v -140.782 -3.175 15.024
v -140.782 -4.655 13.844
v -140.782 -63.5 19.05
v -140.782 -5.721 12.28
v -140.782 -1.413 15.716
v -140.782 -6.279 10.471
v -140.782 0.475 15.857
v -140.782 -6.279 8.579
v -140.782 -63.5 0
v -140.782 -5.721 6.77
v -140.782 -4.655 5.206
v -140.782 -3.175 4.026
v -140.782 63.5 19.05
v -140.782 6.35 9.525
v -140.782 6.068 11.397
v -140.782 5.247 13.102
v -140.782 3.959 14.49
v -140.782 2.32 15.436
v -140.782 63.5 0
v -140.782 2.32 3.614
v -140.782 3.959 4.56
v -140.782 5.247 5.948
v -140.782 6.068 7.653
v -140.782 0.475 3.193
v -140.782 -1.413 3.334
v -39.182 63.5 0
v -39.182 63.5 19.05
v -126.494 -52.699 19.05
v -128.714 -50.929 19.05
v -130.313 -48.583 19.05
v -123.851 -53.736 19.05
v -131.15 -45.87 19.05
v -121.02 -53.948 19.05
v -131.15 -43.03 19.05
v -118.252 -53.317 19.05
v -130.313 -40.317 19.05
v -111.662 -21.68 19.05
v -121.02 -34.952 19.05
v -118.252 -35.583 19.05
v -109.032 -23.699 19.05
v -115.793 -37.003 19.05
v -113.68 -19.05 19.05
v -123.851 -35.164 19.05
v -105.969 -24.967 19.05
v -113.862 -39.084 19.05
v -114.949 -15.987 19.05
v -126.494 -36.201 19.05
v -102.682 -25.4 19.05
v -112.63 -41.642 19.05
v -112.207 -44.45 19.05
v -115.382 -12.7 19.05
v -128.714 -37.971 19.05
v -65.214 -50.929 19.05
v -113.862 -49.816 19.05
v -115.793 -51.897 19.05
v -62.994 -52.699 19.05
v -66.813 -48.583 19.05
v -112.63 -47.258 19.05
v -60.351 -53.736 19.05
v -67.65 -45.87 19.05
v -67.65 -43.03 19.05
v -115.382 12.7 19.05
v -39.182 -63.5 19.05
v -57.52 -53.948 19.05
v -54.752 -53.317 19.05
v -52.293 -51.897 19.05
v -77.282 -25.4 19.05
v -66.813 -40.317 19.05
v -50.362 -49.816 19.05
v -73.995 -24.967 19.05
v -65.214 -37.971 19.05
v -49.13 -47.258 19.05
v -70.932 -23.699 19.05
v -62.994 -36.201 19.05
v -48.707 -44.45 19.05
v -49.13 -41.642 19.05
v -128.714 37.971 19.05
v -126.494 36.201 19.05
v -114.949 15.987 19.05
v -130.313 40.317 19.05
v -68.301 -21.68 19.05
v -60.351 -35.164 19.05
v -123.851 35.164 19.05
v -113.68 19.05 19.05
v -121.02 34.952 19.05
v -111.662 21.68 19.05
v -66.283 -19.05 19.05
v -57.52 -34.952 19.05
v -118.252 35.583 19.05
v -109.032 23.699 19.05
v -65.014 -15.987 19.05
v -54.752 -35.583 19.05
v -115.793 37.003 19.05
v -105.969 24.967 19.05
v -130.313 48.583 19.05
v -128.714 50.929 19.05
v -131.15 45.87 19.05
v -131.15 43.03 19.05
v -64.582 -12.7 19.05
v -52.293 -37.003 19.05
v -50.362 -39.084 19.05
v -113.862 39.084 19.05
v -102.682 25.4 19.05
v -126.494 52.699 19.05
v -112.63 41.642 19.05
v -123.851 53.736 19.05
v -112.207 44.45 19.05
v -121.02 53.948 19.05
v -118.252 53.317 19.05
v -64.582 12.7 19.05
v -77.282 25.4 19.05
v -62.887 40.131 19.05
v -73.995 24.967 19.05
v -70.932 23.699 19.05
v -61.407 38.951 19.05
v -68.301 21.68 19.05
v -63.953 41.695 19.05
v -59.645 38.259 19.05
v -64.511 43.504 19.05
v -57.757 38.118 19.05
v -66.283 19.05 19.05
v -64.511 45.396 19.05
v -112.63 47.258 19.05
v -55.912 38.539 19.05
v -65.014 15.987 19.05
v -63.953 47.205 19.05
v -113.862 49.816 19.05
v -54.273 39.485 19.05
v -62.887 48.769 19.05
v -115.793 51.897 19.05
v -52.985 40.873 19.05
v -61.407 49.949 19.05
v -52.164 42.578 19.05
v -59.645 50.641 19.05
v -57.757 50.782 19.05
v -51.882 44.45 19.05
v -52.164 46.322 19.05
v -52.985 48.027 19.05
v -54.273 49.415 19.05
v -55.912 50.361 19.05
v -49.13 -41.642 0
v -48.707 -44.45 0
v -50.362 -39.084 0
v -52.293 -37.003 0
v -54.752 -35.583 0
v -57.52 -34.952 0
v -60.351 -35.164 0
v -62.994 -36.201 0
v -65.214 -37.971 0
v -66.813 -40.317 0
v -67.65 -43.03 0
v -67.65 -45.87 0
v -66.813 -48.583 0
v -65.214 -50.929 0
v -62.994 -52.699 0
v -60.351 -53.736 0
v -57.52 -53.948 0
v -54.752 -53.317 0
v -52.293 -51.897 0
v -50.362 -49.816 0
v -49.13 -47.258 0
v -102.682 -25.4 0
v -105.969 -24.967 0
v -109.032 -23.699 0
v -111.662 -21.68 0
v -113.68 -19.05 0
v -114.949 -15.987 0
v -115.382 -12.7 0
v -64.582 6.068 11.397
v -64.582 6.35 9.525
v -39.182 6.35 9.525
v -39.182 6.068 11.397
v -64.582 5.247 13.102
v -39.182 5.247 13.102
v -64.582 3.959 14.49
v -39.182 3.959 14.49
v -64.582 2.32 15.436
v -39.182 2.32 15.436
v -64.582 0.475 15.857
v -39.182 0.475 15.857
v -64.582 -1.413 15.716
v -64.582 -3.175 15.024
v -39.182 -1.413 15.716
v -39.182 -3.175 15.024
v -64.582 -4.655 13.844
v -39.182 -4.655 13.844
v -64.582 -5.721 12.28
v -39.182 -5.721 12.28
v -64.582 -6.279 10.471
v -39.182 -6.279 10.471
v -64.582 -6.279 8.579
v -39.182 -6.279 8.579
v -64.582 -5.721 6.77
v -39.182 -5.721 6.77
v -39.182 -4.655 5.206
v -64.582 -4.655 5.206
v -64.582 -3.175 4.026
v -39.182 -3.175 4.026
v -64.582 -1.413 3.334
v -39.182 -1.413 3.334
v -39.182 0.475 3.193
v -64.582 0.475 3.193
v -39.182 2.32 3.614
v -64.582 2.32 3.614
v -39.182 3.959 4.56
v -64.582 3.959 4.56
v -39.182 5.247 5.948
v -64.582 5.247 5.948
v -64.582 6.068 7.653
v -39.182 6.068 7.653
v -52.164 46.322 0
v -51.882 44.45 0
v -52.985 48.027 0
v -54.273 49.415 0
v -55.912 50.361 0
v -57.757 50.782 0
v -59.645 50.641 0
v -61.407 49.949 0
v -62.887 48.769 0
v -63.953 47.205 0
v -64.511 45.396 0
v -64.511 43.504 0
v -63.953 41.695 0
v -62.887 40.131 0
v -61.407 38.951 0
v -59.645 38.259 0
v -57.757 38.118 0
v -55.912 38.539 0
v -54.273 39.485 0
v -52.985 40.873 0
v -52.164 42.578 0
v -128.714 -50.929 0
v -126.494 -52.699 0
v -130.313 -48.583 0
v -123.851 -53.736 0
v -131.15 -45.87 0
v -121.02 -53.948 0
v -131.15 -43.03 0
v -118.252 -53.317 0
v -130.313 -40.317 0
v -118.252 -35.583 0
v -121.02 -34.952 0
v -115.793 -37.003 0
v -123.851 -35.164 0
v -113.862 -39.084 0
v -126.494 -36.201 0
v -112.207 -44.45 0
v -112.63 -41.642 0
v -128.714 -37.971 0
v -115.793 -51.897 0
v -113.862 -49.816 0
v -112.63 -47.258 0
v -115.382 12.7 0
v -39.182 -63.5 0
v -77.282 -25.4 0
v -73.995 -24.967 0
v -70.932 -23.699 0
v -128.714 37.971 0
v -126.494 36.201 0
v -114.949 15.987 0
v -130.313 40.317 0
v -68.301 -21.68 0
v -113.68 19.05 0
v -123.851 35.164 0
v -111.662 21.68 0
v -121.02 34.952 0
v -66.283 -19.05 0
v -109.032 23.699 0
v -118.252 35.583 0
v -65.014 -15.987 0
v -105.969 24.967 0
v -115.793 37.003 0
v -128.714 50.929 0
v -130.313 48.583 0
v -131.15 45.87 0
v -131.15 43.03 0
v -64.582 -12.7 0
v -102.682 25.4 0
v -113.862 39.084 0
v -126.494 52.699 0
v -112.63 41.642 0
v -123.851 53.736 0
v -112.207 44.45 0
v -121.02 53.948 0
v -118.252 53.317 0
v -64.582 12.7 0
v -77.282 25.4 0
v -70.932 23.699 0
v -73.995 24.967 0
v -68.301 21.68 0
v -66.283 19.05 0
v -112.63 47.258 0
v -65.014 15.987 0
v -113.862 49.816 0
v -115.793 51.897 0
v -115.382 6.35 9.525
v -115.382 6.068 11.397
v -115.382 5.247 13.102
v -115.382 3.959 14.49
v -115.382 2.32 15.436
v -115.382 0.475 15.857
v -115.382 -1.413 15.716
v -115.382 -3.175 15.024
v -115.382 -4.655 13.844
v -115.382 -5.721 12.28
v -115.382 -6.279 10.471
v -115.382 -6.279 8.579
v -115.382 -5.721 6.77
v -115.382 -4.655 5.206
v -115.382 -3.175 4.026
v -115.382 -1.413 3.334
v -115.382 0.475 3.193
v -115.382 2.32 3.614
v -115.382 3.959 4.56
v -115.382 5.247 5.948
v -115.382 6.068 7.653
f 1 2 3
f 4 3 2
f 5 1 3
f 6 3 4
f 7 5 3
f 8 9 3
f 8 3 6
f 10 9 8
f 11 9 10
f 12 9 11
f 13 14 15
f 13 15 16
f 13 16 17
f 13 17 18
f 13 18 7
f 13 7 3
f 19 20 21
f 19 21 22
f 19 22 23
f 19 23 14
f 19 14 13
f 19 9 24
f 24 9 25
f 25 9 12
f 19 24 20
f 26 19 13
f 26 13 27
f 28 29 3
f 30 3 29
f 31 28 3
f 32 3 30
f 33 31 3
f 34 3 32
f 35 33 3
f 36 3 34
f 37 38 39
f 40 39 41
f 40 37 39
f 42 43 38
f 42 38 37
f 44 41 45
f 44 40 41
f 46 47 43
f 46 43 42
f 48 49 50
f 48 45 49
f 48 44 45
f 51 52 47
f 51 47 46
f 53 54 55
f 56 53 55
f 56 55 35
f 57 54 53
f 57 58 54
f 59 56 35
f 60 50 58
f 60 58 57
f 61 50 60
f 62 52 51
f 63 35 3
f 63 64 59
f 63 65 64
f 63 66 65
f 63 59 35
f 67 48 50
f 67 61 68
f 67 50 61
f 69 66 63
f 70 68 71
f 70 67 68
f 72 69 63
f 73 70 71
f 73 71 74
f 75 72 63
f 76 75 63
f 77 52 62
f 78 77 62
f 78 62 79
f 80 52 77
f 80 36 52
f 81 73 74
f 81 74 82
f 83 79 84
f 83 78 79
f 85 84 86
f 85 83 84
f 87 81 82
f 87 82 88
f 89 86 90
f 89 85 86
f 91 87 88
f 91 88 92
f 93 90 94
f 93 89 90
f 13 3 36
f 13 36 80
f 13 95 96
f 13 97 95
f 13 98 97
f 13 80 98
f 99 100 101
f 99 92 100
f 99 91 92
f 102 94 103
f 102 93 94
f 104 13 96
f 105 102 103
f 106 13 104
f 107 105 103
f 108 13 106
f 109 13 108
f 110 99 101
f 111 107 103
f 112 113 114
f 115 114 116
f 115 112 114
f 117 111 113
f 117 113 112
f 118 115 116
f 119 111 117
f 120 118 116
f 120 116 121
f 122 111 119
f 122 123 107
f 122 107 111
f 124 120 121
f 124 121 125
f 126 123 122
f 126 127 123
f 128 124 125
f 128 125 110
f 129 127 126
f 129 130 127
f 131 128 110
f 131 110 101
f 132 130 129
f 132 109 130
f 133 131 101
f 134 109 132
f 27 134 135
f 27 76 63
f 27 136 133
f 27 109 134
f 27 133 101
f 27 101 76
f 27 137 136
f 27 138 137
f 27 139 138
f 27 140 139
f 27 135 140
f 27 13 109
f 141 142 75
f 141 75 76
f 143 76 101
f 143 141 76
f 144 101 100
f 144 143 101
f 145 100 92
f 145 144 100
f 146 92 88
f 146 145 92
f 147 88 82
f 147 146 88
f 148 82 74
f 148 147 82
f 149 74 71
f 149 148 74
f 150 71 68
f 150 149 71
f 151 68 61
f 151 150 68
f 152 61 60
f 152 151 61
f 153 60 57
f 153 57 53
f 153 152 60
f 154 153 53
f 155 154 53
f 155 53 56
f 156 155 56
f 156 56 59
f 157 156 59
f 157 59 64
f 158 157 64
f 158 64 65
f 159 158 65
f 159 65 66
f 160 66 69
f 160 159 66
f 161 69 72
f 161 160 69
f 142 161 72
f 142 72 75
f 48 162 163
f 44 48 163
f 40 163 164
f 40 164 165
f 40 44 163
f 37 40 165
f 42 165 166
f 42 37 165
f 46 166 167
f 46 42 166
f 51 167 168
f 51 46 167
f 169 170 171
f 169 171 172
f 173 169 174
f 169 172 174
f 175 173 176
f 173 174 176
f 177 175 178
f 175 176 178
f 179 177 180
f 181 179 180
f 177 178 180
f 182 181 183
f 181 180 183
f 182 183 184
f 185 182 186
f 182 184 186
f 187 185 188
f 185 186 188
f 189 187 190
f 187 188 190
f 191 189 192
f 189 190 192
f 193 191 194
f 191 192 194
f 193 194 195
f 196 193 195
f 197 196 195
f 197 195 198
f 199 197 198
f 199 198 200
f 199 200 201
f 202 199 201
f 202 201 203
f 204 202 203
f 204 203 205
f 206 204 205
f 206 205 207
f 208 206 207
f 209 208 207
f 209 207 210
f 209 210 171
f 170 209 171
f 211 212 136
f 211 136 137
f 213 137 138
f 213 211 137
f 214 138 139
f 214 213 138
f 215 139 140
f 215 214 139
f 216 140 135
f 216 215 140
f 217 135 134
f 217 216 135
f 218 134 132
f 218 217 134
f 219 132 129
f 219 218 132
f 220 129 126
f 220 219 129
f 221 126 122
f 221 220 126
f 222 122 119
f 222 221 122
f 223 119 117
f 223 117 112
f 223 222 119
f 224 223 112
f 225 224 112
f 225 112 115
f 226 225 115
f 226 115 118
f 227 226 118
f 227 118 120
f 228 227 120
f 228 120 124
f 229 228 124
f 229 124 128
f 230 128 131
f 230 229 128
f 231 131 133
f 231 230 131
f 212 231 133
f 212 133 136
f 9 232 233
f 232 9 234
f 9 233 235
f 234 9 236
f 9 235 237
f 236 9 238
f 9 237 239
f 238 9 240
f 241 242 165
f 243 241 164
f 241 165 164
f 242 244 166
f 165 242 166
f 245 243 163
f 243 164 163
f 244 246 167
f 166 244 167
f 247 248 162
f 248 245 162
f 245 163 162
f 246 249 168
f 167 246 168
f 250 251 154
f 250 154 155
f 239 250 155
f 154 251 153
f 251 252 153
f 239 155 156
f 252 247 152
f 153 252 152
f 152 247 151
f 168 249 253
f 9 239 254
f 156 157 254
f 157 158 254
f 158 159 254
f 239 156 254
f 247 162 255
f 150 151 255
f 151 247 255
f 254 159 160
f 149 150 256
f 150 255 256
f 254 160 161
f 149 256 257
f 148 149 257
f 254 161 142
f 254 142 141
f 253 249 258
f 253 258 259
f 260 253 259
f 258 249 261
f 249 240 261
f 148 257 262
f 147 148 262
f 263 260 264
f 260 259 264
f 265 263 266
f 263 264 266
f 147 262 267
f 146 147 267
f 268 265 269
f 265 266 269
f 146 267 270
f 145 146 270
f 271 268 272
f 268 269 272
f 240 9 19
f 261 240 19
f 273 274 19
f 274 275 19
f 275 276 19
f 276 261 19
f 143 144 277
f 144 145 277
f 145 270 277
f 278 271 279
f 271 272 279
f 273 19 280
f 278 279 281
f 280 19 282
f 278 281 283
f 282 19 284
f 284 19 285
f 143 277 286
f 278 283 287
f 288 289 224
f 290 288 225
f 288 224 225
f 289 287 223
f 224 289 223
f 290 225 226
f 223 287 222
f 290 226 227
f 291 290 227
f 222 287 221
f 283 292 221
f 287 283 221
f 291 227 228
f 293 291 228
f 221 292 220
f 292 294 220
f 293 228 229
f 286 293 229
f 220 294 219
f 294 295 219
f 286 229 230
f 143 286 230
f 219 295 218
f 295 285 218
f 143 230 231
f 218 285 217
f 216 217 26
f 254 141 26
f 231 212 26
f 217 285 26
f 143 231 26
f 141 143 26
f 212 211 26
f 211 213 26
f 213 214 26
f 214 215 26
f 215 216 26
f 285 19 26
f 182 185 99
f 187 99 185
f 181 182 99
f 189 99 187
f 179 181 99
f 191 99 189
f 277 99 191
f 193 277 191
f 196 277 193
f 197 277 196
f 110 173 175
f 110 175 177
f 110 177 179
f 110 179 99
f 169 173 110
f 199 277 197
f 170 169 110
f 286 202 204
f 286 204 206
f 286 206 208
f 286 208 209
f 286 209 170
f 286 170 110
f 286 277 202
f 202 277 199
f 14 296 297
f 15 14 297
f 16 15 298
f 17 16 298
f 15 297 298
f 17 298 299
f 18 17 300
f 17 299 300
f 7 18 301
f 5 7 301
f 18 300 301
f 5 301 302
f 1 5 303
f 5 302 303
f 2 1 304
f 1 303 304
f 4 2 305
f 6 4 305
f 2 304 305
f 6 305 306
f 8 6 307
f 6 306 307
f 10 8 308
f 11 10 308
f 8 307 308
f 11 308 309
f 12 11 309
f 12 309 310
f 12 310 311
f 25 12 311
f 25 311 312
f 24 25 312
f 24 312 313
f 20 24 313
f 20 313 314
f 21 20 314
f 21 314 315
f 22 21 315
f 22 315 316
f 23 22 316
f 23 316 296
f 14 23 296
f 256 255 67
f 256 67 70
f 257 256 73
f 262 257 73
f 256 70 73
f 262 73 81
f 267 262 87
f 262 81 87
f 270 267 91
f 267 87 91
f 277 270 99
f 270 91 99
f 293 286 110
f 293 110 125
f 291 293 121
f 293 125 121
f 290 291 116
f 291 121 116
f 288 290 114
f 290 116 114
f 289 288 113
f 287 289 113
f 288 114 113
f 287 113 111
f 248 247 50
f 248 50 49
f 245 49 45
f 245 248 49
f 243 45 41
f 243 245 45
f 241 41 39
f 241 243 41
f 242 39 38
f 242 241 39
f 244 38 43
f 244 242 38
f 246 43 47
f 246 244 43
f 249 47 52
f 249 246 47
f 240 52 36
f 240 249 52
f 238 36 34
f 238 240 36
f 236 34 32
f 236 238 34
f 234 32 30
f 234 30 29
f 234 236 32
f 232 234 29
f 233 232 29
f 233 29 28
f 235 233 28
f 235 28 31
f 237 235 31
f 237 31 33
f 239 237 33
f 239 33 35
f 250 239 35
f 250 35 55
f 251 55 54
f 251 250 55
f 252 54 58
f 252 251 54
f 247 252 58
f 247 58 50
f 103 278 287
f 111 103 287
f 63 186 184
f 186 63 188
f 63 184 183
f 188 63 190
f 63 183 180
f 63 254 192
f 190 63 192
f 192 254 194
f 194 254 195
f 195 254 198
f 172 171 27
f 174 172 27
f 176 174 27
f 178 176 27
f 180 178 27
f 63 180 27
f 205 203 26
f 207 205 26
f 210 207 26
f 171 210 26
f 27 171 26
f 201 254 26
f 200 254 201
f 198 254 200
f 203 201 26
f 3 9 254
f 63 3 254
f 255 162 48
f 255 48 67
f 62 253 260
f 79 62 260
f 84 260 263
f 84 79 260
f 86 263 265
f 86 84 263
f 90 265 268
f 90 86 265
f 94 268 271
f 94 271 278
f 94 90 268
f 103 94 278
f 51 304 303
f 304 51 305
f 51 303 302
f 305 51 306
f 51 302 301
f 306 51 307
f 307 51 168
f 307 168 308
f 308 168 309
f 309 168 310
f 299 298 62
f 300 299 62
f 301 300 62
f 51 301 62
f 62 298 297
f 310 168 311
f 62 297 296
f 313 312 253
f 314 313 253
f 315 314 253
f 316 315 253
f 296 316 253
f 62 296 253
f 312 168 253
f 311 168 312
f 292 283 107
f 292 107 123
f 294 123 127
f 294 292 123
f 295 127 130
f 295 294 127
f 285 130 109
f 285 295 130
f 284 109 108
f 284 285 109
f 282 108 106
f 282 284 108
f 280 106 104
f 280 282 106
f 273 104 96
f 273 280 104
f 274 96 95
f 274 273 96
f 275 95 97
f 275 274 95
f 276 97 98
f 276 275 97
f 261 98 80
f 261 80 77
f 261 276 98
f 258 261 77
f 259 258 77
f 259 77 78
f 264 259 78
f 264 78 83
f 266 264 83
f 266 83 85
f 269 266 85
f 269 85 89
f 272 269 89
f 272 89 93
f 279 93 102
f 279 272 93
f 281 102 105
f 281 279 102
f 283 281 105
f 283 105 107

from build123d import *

# Parameters (mm, degrees)
F0_W     = 101.6
F0_H     = 127
F0_R     = 9.525
F0_W_2   = 50.8
F0_H_2   = 50.8
F0_R_2   = 6.35
F1_DEPTH = 19.05
F2_R     = 12.7
F3_R     = 6.35
F4_DEPTH = 101.601


with BuildPart() as f1:
    # F0 (on Top) → F1 (new body)
    with BuildSketch(Plane.XY):
        with Locations((-89.981672, 0)):
            Rectangle(F0_W, F0_H)
        with Locations((-121.731672, -44.45)):
            Circle(F0_R, mode=Mode.SUBTRACT)
        with Locations((-58.231672, -44.45)):
            Circle(F0_R, mode=Mode.SUBTRACT)
        with Locations((-121.731672, 44.45)):
            Circle(F0_R, mode=Mode.SUBTRACT)
        with Locations((-89.981672, 0)):
            Rectangle(F0_W_2, F0_H_2, mode=Mode.SUBTRACT)
        with Locations((-58.231672, 44.45)):
            Circle(F0_R_2, mode=Mode.SUBTRACT)
    extrude(amount=F1_DEPTH)

    # F2
    f2_edges = [f1.edges().sort_by_distance(p)[0] for p in [
        (-115.381672, -25.4, 9.525),
        (-64.581672, -25.4, 9.525),
        (-64.581672, 25.4, 9.525),
        (-115.381672, 25.4, 9.525),
    ]]
    fillet(f2_edges, radius=F2_R)

    # F3 (on face) → F4 (cut, through all)
    with BuildSketch(Plane.YZ.offset(-39.181672)):
        with Locations((0, 9.525)):
            Circle(F3_R)
    extrude(amount=-F4_DEPTH, mode=Mode.SUBTRACT)


solid = f1.part
